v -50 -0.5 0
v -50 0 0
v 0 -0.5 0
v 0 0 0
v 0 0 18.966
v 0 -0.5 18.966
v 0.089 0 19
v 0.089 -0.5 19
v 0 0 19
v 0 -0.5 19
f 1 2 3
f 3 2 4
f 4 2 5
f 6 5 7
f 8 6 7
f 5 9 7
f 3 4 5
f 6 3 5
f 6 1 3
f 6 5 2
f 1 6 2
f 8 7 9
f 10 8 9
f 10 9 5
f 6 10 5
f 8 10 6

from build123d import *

# Parameters (mm, degrees)
F1_DEPTH = 0.5


# Not quite as in the source:
# - a feature names something its author has since deleted; it is built from what else it names


with BuildPart() as f1:
    # F0 (on Front) → F1 (new body)
    with BuildSketch(Plane.XZ):
        Polygon((0, 18.9663409947), (-50, 0), (0, 0), align=None)
    extrude(amount=F1_DEPTH)


with BuildPart() as f1b:
    # F0 (on Front) → F1, piece 2 (new body)
    with BuildSketch(Plane.XZ):
        Polygon((0, 19), (0, 18.9663409947), (0.0887335236, 19), align=None)
    extrude(amount=F1_DEPTH)


solid = Compound([f1.part, f1b.part])
